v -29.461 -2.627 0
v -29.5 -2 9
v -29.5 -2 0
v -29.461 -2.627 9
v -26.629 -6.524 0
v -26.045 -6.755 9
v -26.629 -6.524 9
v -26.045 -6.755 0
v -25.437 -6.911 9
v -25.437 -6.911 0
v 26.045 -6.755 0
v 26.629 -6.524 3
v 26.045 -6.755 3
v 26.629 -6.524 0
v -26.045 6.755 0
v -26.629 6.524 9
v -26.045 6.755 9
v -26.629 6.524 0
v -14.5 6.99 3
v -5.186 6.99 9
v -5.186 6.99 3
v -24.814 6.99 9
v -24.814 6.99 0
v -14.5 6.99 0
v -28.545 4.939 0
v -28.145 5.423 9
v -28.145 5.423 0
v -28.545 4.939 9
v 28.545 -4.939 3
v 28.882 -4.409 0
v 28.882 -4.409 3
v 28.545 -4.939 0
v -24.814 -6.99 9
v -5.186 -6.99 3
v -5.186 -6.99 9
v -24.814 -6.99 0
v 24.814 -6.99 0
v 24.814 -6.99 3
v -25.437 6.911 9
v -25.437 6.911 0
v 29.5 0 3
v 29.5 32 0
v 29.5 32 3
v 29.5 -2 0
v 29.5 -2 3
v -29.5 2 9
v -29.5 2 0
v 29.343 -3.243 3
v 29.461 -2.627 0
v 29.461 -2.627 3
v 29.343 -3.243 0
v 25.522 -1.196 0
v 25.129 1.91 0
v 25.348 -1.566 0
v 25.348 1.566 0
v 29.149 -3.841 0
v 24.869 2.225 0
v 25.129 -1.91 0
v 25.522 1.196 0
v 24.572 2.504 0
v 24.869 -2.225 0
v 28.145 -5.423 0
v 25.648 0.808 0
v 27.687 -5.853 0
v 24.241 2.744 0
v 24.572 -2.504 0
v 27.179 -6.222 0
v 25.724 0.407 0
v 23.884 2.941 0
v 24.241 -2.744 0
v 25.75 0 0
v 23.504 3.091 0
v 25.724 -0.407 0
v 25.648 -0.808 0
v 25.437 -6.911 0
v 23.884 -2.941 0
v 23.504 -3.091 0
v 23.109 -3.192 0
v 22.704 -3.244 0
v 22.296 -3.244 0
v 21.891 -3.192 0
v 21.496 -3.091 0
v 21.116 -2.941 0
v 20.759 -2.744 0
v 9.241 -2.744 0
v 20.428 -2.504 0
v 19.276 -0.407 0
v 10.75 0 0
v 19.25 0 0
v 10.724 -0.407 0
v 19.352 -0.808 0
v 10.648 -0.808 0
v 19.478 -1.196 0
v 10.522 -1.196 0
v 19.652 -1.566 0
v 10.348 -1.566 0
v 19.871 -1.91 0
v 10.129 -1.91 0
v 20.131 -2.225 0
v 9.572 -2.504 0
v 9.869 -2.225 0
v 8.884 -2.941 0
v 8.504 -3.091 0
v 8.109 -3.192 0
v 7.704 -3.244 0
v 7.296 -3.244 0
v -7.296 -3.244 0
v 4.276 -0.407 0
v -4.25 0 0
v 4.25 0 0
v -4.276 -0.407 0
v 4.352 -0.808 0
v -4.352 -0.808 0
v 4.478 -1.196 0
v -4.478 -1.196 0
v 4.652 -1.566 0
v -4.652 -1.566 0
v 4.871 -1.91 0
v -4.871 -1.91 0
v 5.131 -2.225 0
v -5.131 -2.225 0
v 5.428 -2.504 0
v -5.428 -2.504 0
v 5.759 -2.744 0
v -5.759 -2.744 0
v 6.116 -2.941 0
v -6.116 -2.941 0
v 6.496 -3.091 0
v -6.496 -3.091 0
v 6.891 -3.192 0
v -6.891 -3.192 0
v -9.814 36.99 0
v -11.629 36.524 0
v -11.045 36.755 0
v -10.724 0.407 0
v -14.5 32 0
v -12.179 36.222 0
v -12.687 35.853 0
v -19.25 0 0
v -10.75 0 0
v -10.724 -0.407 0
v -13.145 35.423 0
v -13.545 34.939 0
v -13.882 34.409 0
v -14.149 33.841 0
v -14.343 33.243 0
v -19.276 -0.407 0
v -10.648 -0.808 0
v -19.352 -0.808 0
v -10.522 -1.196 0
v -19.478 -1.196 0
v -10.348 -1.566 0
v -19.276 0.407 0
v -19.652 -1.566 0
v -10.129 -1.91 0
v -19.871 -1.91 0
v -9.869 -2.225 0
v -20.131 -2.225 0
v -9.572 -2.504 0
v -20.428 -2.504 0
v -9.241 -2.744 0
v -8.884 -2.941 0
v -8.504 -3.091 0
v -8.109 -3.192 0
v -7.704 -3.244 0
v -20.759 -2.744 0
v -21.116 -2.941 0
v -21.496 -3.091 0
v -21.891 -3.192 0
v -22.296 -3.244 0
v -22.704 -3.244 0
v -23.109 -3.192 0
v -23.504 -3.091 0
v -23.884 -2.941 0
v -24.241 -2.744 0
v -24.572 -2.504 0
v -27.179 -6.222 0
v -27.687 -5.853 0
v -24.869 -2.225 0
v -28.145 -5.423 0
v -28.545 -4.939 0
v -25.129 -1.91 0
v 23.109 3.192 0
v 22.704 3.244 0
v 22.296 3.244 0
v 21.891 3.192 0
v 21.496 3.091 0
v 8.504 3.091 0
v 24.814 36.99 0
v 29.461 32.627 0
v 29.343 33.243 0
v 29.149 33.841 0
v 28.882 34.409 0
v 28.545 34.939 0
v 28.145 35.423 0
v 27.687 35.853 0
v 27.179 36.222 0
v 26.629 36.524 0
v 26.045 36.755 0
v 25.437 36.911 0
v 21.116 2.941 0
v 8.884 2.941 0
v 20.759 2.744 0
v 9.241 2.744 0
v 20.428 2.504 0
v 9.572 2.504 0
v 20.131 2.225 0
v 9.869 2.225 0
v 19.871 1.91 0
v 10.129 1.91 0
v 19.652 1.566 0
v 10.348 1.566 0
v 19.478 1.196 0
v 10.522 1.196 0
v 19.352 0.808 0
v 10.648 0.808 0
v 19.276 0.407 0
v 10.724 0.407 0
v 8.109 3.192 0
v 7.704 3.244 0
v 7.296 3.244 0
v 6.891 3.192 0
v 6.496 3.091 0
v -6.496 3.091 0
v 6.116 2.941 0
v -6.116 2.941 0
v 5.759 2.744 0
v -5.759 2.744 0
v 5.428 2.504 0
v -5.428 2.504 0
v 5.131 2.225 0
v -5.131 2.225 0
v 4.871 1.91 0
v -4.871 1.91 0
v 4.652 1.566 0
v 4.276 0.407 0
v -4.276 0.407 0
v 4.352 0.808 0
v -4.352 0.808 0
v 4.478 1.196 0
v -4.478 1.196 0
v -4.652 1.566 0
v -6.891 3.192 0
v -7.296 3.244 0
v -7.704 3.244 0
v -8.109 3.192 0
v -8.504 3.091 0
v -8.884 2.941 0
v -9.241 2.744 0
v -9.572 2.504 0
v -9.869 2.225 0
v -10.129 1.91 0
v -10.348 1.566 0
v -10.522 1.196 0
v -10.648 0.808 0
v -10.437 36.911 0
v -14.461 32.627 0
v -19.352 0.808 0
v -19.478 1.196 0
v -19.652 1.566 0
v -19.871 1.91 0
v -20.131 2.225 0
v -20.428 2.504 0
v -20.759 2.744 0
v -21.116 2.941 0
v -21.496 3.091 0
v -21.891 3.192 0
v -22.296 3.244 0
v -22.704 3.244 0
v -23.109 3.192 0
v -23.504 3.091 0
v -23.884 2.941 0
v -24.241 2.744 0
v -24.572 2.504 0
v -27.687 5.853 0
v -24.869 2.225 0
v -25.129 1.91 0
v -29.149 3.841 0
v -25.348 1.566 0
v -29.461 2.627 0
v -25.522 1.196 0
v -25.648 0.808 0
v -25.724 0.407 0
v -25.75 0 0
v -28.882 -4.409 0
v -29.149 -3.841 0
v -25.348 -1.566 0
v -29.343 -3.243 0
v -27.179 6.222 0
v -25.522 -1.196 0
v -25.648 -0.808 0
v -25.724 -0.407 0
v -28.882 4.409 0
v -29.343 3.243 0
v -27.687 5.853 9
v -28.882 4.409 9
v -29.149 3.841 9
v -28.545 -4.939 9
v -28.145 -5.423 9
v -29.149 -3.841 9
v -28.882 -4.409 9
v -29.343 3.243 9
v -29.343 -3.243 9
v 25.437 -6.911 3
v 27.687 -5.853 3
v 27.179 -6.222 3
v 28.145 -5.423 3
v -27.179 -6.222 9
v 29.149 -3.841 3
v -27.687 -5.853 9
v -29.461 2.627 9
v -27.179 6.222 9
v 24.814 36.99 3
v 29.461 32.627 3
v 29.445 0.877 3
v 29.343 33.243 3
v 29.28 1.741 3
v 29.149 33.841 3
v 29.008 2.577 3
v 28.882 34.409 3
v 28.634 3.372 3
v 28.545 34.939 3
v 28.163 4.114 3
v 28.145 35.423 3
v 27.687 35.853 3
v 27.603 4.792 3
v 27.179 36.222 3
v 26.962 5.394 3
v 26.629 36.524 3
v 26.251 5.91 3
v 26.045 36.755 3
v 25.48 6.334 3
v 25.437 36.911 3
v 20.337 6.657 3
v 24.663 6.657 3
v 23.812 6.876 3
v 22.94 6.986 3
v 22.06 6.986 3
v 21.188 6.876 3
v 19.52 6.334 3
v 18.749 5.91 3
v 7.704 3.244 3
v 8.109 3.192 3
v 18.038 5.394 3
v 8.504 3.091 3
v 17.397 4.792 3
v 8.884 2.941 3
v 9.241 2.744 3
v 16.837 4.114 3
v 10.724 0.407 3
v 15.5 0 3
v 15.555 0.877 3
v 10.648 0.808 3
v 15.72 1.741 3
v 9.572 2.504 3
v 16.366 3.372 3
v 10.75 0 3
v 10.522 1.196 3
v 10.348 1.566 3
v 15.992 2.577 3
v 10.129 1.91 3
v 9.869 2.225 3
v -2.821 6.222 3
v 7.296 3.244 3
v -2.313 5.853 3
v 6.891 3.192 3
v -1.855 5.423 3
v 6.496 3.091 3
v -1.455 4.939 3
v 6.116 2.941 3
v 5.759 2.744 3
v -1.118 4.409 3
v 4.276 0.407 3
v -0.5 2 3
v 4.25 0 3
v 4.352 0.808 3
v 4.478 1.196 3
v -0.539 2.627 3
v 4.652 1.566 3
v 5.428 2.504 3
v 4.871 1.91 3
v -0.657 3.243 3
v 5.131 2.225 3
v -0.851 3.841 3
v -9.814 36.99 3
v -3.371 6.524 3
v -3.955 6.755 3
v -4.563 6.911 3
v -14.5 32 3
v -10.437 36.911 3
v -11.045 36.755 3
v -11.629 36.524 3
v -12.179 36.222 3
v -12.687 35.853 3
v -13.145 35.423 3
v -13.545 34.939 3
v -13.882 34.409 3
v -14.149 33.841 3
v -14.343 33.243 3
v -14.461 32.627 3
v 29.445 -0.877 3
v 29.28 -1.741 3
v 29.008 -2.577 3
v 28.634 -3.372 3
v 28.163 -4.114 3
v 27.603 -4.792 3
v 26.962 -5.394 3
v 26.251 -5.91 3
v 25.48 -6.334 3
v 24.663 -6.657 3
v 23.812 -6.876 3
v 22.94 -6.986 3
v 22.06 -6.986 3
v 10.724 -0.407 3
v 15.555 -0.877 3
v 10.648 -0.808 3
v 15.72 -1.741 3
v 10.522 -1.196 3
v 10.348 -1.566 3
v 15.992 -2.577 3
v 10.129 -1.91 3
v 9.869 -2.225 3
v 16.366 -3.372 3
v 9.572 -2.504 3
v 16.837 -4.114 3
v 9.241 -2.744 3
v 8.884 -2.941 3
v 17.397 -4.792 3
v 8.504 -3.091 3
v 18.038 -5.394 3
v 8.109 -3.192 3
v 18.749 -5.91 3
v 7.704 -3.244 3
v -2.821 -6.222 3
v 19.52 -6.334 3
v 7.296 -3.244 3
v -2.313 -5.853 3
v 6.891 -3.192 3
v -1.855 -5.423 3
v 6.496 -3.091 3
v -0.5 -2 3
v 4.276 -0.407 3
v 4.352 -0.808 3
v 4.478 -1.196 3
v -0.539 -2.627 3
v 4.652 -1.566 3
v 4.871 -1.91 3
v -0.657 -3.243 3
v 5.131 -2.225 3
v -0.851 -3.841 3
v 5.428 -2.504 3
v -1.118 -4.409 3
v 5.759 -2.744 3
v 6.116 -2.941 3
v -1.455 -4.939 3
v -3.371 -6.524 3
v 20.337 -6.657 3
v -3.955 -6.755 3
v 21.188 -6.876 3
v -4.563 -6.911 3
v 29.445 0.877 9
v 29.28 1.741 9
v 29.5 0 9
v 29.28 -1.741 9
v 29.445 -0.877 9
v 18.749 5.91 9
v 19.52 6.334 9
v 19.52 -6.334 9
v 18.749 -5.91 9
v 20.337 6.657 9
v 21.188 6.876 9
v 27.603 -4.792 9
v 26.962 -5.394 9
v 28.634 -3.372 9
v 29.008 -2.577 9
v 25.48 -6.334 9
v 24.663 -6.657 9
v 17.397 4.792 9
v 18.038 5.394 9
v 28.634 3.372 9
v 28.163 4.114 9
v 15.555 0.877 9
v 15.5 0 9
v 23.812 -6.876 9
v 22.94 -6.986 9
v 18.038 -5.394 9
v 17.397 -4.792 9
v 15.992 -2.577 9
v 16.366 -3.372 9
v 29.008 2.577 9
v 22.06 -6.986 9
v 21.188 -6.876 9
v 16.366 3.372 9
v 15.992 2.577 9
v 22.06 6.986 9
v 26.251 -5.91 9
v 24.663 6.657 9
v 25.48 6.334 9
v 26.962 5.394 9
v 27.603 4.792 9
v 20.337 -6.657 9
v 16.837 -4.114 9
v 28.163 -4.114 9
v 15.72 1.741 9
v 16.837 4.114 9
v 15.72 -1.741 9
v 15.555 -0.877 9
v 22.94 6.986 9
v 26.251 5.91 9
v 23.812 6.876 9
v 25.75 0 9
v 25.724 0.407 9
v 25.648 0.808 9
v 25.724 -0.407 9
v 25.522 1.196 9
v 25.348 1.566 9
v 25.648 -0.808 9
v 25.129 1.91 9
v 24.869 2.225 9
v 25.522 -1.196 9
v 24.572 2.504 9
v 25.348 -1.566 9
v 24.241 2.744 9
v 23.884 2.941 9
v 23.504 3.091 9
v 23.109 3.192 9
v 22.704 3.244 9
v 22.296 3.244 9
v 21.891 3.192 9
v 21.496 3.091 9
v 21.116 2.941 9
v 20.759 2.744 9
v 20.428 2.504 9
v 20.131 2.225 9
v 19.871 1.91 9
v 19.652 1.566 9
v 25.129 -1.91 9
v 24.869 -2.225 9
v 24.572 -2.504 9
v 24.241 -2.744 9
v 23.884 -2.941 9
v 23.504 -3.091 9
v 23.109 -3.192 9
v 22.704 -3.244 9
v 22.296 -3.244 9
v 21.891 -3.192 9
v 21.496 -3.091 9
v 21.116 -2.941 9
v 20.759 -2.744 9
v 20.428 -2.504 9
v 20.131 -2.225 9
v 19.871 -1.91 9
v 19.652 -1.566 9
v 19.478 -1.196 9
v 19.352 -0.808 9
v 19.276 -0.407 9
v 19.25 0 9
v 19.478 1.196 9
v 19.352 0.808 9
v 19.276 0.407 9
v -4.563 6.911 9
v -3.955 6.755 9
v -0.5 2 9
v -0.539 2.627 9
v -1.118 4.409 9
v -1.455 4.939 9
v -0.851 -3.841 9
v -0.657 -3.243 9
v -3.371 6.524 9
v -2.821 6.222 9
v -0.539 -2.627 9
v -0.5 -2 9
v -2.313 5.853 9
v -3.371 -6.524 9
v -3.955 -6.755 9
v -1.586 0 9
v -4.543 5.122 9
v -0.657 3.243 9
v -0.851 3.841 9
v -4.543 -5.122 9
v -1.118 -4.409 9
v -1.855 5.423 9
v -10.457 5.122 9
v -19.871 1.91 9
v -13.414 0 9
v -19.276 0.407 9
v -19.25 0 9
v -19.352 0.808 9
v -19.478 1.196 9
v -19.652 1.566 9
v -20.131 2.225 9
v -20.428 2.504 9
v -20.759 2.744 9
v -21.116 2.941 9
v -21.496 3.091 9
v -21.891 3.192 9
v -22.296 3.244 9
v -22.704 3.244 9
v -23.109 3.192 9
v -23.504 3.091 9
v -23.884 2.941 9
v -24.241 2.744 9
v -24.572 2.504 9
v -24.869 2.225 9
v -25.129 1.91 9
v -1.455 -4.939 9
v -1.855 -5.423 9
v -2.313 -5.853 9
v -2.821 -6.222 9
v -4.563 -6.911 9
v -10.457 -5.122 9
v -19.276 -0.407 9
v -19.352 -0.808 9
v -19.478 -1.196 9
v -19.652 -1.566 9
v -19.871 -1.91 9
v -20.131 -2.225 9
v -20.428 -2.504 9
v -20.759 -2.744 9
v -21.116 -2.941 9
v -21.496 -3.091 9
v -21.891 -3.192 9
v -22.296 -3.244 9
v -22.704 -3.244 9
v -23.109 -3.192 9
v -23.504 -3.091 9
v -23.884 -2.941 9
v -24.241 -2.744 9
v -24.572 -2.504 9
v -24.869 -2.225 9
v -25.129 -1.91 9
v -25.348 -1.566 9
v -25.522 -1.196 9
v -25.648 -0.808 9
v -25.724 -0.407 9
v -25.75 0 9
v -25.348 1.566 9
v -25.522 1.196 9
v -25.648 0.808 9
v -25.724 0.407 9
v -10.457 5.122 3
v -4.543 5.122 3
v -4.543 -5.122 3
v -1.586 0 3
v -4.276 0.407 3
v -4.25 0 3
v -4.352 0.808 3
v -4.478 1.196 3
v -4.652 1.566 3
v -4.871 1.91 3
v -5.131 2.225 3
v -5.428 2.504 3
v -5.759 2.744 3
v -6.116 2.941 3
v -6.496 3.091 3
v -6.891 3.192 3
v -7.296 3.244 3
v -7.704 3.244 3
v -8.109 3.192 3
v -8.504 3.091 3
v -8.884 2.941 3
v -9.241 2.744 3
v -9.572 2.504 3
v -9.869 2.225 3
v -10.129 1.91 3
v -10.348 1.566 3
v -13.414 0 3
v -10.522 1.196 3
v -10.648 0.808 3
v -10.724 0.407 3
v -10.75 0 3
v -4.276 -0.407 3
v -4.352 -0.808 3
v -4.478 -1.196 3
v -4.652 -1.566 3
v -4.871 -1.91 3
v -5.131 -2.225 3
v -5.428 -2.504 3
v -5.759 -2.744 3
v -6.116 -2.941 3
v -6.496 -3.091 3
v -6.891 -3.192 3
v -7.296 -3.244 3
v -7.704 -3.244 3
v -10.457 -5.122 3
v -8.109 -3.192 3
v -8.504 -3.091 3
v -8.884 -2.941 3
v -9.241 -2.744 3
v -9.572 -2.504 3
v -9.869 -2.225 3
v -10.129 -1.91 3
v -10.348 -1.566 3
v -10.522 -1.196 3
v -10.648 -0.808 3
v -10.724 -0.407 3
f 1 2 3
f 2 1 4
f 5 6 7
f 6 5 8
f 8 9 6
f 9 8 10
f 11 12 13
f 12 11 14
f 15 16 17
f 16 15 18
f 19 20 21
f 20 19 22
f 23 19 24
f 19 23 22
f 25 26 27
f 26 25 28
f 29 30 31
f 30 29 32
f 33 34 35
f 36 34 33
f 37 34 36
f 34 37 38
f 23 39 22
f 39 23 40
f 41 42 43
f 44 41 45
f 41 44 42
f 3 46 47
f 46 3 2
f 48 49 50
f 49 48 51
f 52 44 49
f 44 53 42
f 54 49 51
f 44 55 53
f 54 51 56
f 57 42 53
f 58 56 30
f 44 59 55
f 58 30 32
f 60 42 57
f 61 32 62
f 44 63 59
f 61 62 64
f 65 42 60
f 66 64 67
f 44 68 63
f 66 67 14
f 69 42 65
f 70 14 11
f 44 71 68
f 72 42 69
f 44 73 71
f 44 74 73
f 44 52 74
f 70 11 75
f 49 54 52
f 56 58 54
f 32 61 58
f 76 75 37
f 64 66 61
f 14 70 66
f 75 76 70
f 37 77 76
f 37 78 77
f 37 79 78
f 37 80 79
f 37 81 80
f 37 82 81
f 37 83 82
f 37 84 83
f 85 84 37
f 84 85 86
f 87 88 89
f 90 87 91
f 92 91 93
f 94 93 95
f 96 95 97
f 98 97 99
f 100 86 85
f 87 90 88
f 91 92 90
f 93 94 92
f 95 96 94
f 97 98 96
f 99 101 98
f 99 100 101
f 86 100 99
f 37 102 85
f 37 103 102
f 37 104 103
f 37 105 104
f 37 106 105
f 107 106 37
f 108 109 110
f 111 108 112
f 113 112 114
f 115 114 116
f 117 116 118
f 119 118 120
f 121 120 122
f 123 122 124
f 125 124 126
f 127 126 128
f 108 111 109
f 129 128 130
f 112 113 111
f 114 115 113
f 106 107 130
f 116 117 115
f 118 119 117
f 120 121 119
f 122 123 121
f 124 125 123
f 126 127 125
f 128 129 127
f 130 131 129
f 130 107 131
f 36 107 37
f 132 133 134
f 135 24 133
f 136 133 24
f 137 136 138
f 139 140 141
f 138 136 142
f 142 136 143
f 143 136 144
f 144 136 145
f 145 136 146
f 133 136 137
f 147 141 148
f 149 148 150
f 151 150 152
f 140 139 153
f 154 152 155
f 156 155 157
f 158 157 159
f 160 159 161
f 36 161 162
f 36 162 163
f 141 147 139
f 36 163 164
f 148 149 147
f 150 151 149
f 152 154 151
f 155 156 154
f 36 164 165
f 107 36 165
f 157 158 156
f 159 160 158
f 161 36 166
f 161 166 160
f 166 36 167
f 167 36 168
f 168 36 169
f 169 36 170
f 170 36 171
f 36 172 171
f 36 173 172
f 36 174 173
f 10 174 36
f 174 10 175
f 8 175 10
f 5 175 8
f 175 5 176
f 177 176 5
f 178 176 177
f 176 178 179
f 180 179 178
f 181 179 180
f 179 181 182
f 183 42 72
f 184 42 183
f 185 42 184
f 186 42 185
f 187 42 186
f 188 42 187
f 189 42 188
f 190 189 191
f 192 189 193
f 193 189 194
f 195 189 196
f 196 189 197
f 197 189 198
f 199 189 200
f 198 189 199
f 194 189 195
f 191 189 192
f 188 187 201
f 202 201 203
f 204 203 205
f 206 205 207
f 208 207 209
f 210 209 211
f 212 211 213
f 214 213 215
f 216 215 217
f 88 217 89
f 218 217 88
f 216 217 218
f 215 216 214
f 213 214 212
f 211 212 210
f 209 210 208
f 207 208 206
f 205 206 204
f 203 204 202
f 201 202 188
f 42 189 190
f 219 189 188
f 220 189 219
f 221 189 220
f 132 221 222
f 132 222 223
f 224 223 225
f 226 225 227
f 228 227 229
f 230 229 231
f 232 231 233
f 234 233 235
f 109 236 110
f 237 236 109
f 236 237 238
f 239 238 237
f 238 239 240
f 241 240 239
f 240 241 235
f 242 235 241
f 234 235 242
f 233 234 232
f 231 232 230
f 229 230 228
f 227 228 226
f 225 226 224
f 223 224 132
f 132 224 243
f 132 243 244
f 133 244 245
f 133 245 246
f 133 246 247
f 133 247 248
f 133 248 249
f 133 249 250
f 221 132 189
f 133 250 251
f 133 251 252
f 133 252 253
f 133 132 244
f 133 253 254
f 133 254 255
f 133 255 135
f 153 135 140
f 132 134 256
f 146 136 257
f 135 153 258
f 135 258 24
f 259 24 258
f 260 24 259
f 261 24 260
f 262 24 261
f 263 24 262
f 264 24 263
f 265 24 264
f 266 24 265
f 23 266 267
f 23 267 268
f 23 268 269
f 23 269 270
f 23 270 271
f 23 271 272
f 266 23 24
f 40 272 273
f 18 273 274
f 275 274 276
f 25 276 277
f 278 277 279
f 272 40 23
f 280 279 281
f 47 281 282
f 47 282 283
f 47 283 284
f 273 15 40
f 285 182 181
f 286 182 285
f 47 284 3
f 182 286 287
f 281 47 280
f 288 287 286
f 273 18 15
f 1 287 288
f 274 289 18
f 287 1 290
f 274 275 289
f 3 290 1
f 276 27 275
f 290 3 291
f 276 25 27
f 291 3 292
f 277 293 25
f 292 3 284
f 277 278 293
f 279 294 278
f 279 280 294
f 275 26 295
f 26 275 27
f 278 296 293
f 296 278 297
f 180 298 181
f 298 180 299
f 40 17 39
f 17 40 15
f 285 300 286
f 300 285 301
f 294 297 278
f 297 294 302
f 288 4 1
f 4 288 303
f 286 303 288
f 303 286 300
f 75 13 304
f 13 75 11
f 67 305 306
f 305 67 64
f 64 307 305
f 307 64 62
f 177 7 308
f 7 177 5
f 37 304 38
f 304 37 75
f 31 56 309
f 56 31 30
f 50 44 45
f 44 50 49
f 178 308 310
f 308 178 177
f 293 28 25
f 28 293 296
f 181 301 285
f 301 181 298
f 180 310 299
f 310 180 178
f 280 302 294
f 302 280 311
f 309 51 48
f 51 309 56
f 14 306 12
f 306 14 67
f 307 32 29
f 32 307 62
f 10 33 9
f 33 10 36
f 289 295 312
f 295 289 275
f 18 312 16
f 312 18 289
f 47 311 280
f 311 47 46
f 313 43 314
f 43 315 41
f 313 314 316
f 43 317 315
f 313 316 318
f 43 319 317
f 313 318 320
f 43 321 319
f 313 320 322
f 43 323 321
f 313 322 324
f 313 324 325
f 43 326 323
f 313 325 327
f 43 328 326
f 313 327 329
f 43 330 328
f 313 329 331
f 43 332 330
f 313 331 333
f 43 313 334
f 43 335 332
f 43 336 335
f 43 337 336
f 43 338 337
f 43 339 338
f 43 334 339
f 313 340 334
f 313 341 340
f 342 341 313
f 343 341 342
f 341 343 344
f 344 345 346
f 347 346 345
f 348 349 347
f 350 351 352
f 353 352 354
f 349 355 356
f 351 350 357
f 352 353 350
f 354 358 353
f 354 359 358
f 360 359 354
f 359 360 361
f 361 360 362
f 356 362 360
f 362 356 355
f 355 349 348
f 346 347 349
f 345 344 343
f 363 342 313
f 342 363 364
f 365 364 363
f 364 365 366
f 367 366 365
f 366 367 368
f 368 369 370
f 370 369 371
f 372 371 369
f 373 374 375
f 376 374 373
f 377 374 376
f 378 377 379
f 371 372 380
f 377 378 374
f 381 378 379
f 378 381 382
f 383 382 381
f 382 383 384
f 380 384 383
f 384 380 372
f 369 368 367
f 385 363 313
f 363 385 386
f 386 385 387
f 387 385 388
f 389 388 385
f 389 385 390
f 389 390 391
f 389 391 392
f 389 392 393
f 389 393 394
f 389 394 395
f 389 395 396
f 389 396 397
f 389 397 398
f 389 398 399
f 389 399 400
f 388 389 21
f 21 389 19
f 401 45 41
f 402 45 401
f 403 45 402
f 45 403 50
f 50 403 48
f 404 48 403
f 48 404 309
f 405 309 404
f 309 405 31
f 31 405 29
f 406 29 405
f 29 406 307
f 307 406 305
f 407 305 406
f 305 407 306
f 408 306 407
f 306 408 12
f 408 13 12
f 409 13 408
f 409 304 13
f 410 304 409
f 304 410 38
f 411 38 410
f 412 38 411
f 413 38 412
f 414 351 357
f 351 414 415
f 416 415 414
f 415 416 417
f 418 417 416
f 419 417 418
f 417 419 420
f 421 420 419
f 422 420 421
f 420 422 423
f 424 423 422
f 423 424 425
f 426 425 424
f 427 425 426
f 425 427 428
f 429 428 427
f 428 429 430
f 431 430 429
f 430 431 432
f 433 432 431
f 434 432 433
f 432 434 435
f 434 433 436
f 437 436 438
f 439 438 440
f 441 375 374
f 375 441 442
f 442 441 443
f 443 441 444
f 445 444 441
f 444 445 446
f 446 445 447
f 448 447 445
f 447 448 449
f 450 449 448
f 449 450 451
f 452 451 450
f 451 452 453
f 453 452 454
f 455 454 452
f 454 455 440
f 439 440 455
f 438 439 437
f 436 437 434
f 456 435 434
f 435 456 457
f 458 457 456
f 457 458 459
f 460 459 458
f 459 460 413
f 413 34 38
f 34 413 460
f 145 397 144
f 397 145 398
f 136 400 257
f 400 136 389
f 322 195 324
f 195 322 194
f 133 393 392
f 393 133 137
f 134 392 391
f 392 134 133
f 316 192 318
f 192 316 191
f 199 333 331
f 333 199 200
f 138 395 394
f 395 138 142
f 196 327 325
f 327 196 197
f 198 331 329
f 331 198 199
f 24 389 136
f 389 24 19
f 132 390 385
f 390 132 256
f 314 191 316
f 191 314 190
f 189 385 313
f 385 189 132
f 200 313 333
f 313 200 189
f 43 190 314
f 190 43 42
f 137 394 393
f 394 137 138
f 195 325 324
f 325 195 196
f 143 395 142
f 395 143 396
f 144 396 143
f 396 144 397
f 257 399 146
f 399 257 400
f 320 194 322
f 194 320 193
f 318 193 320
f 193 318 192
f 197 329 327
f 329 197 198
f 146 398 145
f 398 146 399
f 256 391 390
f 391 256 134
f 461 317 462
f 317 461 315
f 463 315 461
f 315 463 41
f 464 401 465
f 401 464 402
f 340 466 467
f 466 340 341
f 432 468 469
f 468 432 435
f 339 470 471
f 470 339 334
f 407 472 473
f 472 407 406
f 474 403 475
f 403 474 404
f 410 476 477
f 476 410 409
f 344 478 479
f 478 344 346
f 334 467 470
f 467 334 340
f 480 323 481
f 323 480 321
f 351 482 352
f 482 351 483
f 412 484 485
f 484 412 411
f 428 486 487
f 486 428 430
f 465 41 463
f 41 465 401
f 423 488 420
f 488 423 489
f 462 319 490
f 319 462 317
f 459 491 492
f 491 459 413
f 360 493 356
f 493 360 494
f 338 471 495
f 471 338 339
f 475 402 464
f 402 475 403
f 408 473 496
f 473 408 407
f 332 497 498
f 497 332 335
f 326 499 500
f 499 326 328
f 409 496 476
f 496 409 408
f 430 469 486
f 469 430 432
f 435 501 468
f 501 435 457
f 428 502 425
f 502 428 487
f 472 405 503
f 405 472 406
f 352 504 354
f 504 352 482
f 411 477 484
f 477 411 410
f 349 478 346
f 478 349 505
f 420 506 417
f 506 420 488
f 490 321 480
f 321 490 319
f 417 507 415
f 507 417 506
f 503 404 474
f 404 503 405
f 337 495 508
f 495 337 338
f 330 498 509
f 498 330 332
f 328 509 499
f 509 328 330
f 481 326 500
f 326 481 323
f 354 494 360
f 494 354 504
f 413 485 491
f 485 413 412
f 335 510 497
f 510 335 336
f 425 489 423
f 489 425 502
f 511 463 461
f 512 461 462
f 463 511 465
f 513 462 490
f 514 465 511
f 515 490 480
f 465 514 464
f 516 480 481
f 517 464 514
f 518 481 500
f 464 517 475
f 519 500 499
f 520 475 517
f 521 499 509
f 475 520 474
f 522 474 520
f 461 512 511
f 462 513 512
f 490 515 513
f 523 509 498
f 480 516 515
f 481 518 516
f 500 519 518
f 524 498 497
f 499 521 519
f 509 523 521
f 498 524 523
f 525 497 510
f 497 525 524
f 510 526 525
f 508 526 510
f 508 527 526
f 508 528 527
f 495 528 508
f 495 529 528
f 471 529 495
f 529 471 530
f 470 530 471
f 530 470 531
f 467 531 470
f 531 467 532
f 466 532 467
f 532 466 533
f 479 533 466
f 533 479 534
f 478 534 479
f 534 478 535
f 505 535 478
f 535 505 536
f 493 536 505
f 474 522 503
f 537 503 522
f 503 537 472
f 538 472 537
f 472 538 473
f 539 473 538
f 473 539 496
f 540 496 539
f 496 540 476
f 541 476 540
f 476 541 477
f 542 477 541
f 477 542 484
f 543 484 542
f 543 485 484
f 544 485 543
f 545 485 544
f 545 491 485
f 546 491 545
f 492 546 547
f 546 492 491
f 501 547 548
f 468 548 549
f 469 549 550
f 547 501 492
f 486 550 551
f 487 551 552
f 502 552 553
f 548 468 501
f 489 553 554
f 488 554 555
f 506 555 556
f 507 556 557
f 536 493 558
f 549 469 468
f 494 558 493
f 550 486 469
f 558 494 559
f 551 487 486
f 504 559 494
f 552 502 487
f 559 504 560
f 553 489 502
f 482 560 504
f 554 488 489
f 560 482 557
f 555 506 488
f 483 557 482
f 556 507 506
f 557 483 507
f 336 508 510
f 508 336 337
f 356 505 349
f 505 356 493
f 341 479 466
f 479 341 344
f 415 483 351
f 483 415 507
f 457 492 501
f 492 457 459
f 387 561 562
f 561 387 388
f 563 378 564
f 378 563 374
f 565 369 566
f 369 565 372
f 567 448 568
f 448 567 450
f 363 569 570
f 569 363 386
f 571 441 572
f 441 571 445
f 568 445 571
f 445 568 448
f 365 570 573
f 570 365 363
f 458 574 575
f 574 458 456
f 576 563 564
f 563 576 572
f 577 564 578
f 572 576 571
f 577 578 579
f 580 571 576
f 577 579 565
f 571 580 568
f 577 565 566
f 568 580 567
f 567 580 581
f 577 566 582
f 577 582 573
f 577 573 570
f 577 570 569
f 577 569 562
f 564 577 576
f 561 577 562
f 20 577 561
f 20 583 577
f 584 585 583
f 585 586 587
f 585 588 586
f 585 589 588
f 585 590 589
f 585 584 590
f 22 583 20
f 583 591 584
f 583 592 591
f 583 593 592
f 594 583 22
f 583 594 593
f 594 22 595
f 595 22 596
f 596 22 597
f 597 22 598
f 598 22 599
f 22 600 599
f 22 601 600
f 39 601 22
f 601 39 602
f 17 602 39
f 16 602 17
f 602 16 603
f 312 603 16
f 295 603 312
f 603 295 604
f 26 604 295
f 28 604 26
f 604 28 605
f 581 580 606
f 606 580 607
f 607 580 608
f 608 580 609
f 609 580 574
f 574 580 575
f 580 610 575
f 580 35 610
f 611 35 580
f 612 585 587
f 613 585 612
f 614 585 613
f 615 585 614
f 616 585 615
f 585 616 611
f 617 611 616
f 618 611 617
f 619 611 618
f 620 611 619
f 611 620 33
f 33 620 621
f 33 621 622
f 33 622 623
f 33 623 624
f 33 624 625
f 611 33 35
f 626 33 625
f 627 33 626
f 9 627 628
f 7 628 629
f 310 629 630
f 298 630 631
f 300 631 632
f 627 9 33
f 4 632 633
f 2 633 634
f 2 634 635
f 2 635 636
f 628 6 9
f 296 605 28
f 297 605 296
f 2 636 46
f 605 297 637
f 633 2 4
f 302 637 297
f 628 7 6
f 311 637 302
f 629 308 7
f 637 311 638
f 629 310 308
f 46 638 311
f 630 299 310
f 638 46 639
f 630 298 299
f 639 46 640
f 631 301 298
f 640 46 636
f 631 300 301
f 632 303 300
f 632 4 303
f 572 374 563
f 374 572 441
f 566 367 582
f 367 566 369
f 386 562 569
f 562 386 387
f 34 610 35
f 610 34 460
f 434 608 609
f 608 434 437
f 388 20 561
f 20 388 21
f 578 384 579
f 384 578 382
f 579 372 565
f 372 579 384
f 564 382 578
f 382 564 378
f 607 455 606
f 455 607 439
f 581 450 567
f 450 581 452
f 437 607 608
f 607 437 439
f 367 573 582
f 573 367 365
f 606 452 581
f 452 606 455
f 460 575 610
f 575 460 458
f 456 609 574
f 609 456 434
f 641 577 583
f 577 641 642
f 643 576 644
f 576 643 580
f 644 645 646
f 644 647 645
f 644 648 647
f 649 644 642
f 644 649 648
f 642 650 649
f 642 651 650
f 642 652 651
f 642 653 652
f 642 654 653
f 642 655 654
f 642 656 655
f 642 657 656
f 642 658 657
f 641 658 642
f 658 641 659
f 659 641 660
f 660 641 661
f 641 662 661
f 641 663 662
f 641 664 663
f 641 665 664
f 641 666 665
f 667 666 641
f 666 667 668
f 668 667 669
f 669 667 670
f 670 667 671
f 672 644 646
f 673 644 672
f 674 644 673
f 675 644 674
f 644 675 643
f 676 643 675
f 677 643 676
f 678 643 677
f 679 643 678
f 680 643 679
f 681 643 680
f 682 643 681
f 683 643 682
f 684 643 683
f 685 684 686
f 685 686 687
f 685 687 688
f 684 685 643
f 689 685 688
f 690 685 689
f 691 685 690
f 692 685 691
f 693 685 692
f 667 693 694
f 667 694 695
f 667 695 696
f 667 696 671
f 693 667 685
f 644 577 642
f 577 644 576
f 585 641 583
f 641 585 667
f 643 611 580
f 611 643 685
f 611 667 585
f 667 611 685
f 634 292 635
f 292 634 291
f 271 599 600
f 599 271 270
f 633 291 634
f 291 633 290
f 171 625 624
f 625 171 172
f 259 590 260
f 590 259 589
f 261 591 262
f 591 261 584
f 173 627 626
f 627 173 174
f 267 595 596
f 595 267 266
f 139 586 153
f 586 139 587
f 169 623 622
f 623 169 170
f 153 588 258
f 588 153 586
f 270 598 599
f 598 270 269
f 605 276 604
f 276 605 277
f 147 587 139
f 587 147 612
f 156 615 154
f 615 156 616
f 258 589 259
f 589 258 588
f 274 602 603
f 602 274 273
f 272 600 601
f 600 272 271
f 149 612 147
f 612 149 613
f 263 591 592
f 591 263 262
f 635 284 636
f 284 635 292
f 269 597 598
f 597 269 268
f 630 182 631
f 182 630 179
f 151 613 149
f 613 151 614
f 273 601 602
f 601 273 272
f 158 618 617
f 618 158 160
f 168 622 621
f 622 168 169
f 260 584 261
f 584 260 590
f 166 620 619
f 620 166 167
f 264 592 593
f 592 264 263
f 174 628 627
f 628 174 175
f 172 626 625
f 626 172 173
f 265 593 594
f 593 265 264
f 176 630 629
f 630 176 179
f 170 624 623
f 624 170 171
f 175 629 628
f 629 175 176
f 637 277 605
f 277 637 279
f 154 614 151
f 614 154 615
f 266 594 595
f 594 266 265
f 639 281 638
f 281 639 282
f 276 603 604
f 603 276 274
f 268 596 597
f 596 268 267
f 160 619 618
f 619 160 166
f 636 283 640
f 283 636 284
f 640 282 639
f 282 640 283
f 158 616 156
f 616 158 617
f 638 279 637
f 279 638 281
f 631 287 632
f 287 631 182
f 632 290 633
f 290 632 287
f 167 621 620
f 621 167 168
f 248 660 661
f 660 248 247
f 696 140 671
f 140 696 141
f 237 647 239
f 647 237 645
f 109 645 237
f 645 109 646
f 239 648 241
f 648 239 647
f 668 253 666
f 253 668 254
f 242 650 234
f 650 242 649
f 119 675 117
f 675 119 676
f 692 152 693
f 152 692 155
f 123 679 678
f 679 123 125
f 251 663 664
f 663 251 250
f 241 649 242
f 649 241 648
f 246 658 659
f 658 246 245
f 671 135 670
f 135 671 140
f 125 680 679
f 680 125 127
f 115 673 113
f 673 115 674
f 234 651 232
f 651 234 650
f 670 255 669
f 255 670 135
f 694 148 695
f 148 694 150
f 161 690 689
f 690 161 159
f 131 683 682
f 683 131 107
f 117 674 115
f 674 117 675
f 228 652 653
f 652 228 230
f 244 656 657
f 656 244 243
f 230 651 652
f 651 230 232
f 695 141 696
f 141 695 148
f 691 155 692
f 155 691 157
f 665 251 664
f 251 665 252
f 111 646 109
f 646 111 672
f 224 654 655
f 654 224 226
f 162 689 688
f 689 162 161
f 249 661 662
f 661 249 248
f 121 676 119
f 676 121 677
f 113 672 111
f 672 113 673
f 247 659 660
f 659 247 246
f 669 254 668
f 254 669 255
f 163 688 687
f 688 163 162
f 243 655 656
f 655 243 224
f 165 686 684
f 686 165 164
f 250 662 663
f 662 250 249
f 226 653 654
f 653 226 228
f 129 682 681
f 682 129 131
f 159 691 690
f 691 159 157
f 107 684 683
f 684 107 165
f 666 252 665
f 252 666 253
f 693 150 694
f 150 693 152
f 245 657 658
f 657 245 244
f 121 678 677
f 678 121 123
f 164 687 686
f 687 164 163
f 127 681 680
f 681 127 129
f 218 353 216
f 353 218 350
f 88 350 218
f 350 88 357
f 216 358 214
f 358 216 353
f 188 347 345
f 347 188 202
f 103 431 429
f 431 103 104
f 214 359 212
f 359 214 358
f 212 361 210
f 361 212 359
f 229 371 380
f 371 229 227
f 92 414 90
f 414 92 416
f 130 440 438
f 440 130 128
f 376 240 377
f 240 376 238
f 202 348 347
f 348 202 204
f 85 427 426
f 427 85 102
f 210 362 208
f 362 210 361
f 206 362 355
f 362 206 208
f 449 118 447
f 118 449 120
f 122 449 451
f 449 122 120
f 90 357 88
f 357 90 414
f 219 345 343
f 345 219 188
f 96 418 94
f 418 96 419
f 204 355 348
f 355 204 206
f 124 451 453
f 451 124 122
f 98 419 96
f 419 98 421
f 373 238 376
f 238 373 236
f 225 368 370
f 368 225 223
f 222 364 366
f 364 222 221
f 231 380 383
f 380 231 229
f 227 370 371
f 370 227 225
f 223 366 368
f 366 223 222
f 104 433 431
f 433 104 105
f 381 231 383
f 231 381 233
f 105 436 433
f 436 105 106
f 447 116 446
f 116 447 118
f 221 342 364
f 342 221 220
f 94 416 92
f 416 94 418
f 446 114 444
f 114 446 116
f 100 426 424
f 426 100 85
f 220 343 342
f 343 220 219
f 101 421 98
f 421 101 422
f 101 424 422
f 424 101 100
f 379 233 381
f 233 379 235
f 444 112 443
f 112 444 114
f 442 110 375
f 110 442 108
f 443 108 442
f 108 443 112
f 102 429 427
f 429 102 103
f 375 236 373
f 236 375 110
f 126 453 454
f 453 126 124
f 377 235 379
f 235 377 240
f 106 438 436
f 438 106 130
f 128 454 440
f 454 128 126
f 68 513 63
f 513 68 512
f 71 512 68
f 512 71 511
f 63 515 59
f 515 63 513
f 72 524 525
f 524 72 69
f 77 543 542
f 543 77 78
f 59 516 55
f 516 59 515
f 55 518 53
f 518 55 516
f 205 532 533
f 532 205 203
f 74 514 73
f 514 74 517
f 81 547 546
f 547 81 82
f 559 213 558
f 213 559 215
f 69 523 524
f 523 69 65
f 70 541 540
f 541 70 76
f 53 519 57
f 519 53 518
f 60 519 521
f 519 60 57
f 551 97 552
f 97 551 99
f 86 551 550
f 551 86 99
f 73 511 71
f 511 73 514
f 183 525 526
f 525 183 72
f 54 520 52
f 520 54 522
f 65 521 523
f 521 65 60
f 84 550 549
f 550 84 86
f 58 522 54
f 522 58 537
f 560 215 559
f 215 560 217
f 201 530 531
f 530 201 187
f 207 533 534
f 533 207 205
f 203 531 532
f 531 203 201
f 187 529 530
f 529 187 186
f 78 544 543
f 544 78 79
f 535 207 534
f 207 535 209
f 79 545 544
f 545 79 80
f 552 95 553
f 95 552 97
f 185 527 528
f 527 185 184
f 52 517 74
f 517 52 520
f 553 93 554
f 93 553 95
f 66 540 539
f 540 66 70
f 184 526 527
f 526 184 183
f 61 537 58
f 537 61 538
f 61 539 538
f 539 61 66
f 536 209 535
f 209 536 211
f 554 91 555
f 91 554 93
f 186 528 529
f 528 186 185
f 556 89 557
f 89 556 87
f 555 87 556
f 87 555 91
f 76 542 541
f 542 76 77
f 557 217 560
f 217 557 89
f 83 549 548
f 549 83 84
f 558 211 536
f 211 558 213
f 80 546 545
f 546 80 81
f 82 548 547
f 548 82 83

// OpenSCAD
$fn = 50;


difference() {
	union() {
		hull() {
			translate(v = [-24.5000000000, 2.0000000000, 0]) {
				cylinder(h = 3, r = 5);
			}
			translate(v = [24.5000000000, 2.0000000000, 0]) {
				cylinder(h = 3, r = 5);
			}
			translate(v = [-24.5000000000, -2.0000000000, 0]) {
				cylinder(h = 3, r = 5);
			}
			translate(v = [24.5000000000, -2.0000000000, 0]) {
				cylinder(h = 3, r = 5);
			}
		}
		translate(v = [7.5000000000, 15.0000000000, 0]) {
			hull() {
				translate(v = [-17.0000000000, 17.0000000000, 0]) {
					cylinder(h = 3, r = 5);
				}
				translate(v = [17.0000000000, 17.0000000000, 0]) {
					cylinder(h = 3, r = 5);
				}
				translate(v = [-17.0000000000, -17.0000000000, 0]) {
					cylinder(h = 3, r = 5);
				}
				translate(v = [17.0000000000, -17.0000000000, 0]) {
					cylinder(h = 3, r = 5);
				}
			}
		}
		translate(v = [22.5000000000, 0, 0]) {
			cylinder(h = 9, r = 7.0000000000);
		}
		translate(v = [-15.0000000000, 0, 0]) {
			hull() {
				translate(v = [-9.5000000000, 2.0000000000, 0]) {
					cylinder(h = 9, r = 5);
				}
				translate(v = [9.5000000000, 2.0000000000, 0]) {
					cylinder(h = 9, r = 5);
				}
				translate(v = [-9.5000000000, -2.0000000000, 0]) {
					cylinder(h = 9, r = 5);
				}
				translate(v = [9.5000000000, -2.0000000000, 0]) {
					cylinder(h = 9, r = 5);
				}
			}
		}
	}
	union() {
		translate(v = [-7.5000000000, 0, 9]) {
			rotate(a = [0, 0, 0]) {
				difference() {
					union() {
						translate(v = [0, 0, -6]) {
							linear_extrude(height = 6) {
								polygon(points = [[5.9142500000, 0.0000000000], [2.9571250000, 5.1218907443], [-2.9571250000, 5.1218907443], [-5.9142500000, 0.0000000000], [-2.9571250000, -5.1218907443], [2.9571250000, -5.1218907443]]);
							}
						}
					}
					union();
				}
			}
		}
		translate(v = [-22.5000000000, 0.0000000000, 0]) {
			translate(v = [0, 0, -50]) {
				cylinder(h = 100, r = 3.2500000000);
			}
		}
		translate(v = [-7.5000000000, 0.0000000000, 0]) {
			translate(v = [0, 0, -50]) {
				cylinder(h = 100, r = 3.2500000000);
			}
		}
		translate(v = [7.5000000000, 0.0000000000, 0]) {
			translate(v = [0, 0, -50]) {
				cylinder(h = 100, r = 3.2500000000);
			}
		}
		translate(v = [22.5000000000, 0.0000000000, 0]) {
			translate(v = [0, 0, -50]) {
				cylinder(h = 100, r = 3.2500000000);
			}
		}
	}
}
